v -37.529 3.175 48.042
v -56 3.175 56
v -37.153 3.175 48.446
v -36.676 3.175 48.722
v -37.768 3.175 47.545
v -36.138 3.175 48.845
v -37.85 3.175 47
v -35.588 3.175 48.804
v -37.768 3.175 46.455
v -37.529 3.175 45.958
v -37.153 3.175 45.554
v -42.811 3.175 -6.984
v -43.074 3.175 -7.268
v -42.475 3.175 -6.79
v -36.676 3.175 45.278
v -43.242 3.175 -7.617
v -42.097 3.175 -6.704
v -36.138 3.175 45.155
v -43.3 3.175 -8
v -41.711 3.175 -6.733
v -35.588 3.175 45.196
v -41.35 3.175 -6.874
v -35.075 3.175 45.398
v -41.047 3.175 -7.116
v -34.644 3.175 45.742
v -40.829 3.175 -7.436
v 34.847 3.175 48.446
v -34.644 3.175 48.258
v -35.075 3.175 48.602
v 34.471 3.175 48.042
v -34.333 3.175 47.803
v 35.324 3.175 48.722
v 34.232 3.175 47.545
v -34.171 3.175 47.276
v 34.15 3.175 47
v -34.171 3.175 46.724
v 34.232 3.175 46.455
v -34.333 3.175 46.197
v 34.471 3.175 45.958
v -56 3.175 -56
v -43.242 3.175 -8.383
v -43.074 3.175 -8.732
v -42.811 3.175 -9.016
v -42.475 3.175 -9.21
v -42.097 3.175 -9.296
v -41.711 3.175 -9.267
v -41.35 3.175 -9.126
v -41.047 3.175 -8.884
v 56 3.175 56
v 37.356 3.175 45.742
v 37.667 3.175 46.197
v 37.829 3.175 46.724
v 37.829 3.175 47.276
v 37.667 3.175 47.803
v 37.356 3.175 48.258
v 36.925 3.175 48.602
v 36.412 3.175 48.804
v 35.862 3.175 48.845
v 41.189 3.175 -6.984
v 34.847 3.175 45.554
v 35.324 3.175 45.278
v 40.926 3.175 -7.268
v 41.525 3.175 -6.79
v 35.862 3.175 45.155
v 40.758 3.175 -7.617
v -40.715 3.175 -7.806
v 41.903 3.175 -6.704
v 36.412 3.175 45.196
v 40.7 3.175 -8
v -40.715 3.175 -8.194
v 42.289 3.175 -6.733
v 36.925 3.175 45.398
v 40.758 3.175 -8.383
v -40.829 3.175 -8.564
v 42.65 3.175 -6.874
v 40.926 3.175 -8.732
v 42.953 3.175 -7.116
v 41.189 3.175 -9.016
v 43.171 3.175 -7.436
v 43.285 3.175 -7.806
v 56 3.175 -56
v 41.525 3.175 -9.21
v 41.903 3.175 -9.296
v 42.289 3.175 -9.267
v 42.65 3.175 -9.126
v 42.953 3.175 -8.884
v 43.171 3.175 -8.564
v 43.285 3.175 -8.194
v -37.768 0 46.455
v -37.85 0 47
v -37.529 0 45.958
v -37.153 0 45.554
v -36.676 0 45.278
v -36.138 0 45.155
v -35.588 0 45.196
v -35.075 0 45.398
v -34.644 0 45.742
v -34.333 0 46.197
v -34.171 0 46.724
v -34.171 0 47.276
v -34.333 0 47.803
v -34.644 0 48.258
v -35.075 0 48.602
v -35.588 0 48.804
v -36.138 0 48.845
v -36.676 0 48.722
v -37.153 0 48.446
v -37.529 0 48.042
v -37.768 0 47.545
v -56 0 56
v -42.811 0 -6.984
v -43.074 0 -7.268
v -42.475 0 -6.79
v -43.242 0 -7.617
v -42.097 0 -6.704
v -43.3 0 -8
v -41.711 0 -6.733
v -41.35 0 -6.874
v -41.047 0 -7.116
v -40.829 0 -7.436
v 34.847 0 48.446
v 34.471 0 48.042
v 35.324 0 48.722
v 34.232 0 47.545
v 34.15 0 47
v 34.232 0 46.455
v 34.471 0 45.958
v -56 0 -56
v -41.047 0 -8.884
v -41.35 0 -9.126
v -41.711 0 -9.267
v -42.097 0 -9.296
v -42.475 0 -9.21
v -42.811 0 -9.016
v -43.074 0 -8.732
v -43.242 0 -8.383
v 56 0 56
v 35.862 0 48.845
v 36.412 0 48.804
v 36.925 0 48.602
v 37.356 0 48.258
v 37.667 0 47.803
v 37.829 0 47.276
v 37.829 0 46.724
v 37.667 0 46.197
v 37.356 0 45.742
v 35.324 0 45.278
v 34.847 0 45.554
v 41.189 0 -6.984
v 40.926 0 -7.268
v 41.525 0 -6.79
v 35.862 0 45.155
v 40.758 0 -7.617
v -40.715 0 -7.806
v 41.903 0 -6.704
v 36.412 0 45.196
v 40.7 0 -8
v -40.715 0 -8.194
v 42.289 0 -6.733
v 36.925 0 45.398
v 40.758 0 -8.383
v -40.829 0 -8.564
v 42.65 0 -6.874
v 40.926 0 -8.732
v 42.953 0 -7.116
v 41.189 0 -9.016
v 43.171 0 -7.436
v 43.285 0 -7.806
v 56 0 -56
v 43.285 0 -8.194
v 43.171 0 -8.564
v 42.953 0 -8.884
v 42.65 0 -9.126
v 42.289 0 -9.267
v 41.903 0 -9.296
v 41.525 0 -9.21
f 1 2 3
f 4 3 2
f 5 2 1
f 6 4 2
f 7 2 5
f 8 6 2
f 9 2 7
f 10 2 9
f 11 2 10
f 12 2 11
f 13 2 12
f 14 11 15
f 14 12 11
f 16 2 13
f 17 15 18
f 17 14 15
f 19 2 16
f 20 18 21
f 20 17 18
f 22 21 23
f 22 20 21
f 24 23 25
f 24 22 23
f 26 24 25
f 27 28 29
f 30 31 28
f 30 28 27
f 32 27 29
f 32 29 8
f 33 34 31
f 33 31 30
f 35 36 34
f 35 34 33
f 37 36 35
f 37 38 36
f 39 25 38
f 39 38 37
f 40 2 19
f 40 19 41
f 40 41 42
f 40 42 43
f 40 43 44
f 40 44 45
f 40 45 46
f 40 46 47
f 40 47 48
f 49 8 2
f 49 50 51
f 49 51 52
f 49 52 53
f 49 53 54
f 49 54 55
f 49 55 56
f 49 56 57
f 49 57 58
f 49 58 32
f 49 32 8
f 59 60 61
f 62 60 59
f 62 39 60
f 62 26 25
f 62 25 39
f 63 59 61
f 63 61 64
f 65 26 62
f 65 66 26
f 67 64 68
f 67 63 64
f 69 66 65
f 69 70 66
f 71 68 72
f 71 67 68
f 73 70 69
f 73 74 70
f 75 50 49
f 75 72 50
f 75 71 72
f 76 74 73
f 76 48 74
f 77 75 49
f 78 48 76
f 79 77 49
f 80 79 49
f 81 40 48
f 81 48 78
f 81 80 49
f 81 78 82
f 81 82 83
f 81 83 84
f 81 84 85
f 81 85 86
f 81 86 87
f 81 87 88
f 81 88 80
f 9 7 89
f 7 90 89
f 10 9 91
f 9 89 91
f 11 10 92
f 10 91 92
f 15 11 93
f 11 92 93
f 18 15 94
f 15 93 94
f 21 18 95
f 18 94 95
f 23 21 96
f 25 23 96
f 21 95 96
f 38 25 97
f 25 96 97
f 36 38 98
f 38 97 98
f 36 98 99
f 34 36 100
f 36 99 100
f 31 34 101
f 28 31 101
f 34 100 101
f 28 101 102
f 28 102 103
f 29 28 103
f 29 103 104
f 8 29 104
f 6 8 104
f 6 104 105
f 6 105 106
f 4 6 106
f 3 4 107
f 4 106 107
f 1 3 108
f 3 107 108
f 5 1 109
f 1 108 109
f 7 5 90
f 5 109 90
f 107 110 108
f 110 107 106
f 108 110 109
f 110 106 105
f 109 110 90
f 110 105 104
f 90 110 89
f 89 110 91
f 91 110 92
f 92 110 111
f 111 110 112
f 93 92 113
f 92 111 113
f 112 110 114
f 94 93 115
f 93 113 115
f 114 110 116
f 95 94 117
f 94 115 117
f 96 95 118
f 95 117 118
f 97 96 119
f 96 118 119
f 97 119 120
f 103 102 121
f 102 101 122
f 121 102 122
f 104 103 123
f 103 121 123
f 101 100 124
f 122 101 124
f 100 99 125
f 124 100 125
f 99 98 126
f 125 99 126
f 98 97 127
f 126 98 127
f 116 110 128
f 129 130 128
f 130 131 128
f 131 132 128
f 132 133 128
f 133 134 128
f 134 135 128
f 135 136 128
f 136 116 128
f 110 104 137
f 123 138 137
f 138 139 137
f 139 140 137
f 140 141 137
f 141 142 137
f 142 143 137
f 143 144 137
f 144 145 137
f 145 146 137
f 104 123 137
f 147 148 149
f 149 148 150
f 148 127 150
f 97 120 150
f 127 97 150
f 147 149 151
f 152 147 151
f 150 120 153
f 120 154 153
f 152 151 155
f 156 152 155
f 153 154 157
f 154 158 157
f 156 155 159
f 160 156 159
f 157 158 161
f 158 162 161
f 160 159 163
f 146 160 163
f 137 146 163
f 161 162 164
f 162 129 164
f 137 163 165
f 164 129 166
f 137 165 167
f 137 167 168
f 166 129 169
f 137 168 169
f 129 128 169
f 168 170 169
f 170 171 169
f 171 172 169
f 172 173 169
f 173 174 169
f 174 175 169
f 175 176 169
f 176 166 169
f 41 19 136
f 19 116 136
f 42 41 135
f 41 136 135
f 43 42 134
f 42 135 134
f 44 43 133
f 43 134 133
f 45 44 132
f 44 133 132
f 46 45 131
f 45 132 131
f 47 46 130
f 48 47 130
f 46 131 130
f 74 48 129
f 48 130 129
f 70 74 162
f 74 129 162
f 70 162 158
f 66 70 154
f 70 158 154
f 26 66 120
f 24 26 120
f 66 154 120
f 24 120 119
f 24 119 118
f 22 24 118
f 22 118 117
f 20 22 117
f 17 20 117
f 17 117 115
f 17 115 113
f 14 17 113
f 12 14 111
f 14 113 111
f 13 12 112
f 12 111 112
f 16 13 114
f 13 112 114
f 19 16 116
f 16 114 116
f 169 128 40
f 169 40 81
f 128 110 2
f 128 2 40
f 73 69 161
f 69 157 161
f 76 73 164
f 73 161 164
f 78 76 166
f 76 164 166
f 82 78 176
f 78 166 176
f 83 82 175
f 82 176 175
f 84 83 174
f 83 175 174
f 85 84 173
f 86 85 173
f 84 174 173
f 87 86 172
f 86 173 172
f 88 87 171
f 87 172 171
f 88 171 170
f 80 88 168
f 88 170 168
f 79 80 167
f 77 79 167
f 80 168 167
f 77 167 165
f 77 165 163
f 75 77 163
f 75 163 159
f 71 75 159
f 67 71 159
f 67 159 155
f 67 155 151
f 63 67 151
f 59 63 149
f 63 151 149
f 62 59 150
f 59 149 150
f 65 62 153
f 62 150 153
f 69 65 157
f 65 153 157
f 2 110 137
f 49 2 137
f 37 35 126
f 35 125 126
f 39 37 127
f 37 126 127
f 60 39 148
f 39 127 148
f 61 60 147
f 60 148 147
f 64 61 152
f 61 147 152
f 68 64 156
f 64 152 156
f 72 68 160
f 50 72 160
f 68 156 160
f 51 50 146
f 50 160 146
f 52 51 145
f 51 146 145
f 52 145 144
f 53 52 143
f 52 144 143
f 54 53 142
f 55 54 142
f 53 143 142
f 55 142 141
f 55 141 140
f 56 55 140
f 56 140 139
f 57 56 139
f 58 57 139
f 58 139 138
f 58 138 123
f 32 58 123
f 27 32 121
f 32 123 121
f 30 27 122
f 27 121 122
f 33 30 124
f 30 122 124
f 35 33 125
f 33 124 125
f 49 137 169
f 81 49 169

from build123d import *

# Parameters (mm, degrees)
ESQUISSE1_W          = 112
ESQUISSE1_H          = 112
BOSS_EXTRU_1_DEPTH   = 3.175
D_GAGEMENT_M41_D     = 3.7
D_GAGEMENT_M41_DEPTH = 3.175
D_GAGEMENT_M41_TIP   = 1.111592145
D_GAGEMENT_M32_D     = 2.6
D_GAGEMENT_M32_DEPTH = 3.175
D_GAGEMENT_M32_TIP   = 0.781118805


with BuildPart() as part:
    # Esquisse1 → Boss.-Extru.1 (new body)
    with BuildSketch(Plane(origin=(0, 0, 0), x_dir=(1, 0, 0), z_dir=(0, 1, 0))):
        Rectangle(ESQUISSE1_W, ESQUISSE1_H)
    extrude(amount=BOSS_EXTRU_1_DEPTH)

    # Dégagement M41
    with Locations(Plane(origin=(0, 3.175, 0), x_dir=(1, 0, 0), z_dir=(0, 1, 0))):
        with Locations((-36, -47), (36, -47)):
            Hole(D_GAGEMENT_M41_D / 2, depth=D_GAGEMENT_M41_DEPTH)
            with Locations((0, 0, -(D_GAGEMENT_M41_DEPTH + D_GAGEMENT_M41_TIP / 2))):  # 118° drill point
                Cone(0, D_GAGEMENT_M41_D / 2, D_GAGEMENT_M41_TIP, mode=Mode.SUBTRACT)

    # Dégagement M32
    with Locations(Plane(origin=(0, 3.175, 0), x_dir=(1, 0, 0), z_dir=(0, 1, 0))):
        with Locations((42, 8), (-42, 8)):
            Hole(D_GAGEMENT_M32_D / 2, depth=D_GAGEMENT_M32_DEPTH)
            with Locations((0, 0, -(D_GAGEMENT_M32_DEPTH + D_GAGEMENT_M32_TIP / 2))):  # 118° drill point
                Cone(0, D_GAGEMENT_M32_D / 2, D_GAGEMENT_M32_TIP, mode=Mode.SUBTRACT)


solid = part.part
